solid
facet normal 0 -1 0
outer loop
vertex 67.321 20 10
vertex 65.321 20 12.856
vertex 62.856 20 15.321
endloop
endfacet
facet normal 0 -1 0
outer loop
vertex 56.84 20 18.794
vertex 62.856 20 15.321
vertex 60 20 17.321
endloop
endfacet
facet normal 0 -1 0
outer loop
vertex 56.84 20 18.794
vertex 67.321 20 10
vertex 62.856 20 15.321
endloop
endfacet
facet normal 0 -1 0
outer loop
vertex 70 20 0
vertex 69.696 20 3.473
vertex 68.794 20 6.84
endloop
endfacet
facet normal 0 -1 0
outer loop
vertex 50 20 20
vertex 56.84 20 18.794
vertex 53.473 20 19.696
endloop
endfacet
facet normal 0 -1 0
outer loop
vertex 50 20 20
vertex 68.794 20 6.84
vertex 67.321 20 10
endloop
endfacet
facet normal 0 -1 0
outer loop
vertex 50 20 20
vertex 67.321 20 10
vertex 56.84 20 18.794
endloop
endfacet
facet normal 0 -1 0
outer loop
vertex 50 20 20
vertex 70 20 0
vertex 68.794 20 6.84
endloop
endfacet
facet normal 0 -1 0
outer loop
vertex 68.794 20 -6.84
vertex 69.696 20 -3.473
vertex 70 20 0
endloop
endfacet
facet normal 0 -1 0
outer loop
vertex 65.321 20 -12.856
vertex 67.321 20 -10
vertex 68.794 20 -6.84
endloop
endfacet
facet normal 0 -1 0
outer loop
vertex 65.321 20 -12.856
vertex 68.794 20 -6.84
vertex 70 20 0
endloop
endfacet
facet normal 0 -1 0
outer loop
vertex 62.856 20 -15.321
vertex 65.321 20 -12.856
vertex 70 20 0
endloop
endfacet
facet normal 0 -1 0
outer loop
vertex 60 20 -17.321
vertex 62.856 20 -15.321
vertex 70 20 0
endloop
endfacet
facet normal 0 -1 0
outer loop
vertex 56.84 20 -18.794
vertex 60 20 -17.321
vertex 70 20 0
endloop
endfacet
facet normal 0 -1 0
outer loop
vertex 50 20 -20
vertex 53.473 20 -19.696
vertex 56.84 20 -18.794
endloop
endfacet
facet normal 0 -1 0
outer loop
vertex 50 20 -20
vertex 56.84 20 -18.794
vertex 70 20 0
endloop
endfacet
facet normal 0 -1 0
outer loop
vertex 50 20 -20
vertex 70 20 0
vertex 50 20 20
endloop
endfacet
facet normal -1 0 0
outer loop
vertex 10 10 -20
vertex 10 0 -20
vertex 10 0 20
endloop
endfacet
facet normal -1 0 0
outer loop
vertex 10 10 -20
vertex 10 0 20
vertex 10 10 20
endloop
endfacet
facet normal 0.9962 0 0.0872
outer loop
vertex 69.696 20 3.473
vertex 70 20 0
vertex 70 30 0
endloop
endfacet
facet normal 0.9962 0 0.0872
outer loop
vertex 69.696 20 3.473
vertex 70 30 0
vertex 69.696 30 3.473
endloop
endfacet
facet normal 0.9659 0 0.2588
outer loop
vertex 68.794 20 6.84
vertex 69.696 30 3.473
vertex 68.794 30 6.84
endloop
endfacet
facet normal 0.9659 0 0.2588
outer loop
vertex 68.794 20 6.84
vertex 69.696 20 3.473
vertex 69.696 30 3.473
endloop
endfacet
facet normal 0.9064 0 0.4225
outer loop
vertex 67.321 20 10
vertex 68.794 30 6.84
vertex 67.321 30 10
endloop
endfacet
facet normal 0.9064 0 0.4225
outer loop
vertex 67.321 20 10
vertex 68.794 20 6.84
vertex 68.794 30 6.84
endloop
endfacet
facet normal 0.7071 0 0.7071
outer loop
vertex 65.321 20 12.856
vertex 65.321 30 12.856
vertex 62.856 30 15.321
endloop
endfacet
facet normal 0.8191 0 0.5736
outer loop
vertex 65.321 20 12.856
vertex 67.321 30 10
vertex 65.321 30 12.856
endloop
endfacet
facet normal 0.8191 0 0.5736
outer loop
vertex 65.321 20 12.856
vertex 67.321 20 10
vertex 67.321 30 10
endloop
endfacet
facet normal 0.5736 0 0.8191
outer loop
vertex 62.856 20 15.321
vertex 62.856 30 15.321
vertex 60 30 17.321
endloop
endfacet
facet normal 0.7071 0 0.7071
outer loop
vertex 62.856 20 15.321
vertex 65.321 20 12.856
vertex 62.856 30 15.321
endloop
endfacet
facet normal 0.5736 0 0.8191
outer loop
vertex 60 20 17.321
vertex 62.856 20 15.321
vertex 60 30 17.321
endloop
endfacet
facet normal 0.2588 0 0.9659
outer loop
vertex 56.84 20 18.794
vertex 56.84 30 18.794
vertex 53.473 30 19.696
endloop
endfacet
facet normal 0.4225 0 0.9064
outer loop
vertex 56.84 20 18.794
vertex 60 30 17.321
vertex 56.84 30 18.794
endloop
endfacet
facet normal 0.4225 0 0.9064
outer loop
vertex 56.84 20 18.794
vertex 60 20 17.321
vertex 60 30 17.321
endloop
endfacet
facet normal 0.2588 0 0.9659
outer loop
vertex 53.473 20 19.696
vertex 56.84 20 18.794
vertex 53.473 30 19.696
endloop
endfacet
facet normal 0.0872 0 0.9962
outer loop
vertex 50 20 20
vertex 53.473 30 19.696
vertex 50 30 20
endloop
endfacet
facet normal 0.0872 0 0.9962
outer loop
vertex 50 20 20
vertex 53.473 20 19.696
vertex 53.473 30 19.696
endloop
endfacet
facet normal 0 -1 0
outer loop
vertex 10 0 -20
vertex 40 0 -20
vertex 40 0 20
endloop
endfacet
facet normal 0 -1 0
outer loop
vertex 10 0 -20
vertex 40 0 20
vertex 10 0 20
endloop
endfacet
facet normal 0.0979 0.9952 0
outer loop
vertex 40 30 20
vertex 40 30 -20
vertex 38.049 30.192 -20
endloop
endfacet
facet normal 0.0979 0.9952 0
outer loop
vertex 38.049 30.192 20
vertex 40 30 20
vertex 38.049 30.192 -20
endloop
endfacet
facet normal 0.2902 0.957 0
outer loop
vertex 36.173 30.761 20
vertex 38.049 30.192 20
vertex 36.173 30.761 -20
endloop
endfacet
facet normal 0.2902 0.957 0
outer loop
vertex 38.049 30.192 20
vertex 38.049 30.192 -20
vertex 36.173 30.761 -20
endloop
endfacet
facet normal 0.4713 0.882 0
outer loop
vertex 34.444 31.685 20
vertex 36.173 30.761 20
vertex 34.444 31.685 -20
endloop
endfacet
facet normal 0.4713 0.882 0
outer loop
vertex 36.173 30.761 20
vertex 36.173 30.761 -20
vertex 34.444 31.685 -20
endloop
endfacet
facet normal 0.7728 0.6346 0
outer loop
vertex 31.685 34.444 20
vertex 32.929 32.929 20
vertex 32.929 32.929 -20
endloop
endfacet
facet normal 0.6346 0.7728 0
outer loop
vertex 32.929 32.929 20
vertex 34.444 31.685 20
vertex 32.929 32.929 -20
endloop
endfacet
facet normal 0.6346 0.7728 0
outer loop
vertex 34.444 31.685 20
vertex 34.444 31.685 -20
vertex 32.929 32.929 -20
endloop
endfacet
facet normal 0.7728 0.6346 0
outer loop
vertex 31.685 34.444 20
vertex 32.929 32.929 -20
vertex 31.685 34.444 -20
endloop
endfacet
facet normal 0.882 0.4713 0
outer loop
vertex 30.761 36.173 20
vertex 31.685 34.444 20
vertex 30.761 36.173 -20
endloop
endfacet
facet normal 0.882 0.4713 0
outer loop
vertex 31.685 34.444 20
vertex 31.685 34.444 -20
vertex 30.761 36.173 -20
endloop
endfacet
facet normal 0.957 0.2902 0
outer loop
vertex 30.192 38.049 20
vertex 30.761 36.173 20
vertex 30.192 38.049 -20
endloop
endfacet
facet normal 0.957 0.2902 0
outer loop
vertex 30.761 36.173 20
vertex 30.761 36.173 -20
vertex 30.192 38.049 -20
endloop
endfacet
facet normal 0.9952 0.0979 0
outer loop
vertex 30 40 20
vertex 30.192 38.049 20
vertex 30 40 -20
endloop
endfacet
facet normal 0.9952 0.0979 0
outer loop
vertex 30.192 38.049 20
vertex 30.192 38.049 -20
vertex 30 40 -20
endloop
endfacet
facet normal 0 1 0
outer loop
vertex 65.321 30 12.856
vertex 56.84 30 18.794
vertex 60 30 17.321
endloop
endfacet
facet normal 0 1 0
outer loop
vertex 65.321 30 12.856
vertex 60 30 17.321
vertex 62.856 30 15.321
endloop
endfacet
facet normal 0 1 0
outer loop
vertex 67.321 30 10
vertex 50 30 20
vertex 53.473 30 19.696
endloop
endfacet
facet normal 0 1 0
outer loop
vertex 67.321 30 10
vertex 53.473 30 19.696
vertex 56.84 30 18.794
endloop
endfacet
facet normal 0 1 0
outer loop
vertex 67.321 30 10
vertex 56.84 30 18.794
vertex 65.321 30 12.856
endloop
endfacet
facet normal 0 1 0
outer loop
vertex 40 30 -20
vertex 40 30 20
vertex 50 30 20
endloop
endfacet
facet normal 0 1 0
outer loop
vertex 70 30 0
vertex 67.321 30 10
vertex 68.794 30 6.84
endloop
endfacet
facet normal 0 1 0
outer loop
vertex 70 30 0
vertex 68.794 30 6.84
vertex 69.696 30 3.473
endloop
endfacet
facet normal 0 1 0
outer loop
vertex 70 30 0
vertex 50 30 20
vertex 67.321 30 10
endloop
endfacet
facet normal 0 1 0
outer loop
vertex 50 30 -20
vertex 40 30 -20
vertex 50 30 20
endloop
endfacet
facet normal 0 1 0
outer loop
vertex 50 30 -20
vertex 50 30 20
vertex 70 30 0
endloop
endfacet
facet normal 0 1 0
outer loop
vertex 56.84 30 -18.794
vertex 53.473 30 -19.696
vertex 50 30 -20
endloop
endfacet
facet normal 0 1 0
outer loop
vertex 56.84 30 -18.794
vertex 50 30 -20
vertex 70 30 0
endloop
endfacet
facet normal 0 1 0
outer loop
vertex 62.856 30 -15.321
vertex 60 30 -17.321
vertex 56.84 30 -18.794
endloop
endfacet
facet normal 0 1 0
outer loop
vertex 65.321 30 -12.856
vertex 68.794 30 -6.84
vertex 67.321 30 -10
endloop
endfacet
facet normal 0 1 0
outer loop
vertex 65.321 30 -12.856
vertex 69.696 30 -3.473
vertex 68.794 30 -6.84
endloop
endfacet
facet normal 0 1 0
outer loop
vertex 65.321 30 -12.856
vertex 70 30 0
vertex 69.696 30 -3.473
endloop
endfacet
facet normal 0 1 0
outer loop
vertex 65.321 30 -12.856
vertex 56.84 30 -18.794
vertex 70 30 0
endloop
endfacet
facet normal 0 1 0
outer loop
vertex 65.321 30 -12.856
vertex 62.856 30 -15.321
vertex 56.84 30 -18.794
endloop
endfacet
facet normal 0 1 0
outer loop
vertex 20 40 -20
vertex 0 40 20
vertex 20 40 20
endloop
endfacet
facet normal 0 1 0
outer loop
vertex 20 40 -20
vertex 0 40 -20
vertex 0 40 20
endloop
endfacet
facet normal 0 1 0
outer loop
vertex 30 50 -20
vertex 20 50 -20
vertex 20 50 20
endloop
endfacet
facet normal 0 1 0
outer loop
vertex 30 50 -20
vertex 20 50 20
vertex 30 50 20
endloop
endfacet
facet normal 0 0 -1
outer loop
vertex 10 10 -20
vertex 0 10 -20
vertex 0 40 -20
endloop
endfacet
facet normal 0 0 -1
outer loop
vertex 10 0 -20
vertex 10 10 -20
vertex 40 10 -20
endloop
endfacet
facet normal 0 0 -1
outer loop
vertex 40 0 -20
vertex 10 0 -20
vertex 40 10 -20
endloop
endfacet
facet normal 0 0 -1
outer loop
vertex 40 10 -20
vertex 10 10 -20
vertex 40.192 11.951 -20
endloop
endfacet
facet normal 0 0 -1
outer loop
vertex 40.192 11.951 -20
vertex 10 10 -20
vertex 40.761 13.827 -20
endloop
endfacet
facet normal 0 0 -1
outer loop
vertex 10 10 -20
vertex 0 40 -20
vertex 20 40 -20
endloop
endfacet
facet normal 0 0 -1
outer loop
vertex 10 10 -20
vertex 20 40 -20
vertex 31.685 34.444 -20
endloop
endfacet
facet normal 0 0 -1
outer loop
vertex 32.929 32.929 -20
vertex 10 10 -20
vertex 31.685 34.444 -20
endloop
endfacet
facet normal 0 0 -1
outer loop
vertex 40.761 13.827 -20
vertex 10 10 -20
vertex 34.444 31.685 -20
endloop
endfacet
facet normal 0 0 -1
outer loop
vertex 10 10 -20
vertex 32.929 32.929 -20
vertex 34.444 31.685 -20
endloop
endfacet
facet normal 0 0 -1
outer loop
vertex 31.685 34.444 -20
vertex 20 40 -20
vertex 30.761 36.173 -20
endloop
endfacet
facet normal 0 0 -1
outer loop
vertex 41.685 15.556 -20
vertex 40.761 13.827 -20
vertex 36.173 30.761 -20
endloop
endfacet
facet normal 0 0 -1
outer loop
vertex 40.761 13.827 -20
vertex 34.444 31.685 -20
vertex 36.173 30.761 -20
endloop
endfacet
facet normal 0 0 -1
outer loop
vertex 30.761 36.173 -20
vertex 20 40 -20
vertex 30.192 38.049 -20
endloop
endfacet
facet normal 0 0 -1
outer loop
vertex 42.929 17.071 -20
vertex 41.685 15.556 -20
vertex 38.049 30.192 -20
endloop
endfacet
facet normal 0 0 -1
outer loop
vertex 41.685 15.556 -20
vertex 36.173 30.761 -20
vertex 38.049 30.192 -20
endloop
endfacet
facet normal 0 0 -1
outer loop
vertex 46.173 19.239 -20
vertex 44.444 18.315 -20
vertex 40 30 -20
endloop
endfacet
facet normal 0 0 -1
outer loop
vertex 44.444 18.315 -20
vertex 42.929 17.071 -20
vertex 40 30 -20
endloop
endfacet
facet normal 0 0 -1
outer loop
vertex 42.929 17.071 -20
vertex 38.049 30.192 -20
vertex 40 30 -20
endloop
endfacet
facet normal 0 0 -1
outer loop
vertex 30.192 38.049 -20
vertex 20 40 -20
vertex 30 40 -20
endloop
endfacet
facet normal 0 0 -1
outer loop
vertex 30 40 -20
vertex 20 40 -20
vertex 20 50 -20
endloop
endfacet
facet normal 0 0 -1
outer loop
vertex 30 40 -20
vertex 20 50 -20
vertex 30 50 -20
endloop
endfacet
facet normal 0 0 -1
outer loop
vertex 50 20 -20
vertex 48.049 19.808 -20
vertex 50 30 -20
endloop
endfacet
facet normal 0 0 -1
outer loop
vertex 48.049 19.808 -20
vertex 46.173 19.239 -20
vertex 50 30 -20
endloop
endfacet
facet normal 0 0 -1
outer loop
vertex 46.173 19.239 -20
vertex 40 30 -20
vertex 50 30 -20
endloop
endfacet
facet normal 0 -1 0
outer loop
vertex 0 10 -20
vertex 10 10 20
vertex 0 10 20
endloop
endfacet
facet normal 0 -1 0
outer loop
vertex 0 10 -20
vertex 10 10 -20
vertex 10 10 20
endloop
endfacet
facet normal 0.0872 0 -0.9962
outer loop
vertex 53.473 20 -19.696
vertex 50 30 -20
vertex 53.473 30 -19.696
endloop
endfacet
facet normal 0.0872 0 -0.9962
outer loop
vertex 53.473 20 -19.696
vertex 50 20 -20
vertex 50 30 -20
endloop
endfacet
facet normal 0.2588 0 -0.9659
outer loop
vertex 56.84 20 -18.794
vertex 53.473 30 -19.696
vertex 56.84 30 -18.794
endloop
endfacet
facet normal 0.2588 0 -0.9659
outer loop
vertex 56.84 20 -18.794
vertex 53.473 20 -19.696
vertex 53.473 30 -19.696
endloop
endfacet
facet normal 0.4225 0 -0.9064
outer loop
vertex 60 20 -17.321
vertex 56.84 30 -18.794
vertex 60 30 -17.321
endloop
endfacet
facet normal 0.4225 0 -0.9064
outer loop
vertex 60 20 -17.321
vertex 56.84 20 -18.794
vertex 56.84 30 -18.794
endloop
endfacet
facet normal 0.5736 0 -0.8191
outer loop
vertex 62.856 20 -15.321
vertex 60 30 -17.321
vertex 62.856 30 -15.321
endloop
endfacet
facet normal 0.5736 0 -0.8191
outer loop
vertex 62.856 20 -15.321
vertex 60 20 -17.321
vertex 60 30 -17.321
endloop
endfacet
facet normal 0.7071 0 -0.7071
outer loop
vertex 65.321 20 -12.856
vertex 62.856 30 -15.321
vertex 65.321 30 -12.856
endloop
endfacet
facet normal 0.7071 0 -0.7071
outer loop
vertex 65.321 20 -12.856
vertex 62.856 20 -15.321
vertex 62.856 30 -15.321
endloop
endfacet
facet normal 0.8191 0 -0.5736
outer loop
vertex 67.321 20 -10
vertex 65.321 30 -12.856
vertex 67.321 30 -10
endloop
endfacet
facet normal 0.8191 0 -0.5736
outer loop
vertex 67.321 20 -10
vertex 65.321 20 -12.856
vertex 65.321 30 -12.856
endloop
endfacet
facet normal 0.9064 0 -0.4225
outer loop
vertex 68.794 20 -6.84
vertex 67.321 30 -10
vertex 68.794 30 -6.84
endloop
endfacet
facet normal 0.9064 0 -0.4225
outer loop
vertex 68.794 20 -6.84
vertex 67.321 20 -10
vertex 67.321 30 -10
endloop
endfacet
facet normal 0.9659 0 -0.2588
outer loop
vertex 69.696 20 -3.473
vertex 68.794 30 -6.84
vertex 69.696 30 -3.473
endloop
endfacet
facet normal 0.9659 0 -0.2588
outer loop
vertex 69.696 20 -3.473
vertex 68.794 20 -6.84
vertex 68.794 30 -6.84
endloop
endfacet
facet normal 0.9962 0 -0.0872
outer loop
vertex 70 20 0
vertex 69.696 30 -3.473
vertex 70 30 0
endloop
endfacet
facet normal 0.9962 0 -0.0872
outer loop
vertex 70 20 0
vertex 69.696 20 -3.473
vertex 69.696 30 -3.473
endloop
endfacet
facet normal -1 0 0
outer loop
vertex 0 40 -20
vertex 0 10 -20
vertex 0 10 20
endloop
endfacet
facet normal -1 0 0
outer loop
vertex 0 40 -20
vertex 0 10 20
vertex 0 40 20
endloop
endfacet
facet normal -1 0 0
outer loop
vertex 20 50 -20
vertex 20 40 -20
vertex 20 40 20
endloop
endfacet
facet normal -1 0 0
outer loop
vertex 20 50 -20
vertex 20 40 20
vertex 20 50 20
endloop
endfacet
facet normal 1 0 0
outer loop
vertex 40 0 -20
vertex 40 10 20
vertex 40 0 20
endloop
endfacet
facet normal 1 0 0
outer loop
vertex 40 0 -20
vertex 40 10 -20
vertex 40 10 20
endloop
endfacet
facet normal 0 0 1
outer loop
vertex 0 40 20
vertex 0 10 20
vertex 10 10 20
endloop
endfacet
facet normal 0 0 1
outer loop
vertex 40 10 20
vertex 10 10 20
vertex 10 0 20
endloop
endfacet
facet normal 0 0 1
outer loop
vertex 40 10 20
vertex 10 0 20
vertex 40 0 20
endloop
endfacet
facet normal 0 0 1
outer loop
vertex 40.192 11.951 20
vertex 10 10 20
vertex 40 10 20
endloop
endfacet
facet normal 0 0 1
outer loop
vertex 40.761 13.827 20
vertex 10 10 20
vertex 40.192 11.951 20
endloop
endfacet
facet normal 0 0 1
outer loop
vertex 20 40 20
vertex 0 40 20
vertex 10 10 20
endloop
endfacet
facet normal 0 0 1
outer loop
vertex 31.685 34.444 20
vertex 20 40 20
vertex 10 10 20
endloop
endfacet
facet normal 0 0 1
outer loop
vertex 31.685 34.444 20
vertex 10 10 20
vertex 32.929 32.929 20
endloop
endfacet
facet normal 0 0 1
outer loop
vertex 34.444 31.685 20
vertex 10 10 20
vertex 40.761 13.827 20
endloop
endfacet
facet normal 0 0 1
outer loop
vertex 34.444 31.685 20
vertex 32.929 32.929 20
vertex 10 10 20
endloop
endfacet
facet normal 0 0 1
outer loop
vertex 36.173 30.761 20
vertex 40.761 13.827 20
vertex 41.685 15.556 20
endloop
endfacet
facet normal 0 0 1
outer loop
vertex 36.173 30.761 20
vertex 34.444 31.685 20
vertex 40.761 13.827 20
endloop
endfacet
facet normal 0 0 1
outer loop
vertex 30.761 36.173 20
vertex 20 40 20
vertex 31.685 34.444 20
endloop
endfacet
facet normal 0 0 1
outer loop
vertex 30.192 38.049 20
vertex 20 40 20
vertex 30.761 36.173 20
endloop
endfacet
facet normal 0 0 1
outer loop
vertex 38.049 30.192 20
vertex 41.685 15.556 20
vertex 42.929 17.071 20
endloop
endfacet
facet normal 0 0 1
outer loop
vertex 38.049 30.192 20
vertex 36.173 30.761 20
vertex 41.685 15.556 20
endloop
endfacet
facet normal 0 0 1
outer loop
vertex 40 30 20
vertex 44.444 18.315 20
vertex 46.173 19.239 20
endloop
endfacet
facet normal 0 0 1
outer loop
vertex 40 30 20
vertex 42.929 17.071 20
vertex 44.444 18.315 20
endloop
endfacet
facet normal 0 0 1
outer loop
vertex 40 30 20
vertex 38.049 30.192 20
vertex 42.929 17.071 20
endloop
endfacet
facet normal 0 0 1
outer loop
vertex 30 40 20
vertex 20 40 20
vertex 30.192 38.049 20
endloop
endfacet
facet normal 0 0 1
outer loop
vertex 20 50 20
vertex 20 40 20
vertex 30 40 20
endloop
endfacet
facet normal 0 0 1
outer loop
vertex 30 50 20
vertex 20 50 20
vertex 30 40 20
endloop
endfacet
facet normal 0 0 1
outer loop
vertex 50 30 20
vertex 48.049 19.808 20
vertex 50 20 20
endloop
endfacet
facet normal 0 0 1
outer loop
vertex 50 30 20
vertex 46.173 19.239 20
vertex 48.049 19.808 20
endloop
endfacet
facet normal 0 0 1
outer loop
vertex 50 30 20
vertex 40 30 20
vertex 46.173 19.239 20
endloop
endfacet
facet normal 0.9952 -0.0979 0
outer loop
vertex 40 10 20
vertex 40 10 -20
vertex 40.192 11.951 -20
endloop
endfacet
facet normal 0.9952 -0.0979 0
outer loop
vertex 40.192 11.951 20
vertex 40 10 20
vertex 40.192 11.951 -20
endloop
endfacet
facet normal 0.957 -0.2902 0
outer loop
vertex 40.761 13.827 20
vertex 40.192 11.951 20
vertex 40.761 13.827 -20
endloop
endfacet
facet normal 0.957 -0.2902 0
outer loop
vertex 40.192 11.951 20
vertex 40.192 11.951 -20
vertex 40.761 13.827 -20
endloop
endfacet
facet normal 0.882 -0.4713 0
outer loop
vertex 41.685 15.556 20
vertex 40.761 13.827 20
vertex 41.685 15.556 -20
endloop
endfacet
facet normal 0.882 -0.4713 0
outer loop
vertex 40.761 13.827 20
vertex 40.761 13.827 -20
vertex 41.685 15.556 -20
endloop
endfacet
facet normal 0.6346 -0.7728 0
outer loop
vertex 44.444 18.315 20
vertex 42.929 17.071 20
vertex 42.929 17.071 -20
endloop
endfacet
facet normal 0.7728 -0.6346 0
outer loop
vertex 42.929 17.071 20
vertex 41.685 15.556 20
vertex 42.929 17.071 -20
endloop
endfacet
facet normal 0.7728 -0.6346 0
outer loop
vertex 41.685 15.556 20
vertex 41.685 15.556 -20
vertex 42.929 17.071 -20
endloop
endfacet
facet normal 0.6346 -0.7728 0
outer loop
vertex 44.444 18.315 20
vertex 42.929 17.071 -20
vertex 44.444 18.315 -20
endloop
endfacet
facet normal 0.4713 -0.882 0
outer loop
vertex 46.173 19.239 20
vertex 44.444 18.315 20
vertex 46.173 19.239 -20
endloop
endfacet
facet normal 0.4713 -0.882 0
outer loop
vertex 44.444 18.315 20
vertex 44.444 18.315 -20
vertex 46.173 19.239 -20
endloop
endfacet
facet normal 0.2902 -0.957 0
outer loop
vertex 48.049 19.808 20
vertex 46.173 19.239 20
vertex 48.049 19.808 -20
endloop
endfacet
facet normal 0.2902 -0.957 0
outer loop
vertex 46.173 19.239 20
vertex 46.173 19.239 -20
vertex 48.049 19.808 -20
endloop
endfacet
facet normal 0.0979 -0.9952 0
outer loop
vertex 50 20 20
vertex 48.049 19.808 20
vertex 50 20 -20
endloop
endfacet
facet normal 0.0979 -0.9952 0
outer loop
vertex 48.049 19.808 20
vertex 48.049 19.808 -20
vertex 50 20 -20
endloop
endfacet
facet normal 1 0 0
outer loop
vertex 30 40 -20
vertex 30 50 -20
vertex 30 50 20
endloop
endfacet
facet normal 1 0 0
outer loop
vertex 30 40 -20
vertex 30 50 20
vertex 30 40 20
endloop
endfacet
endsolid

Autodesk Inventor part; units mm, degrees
ref_plane "YZ Plane" through (0, 0, 0) normal (1, 0, 0) x (0, 1, 0)
ref_plane "XZ Plane" through (0, 0, 0) normal (0, 1, 0) x (-1, 0, 0)
ref_plane "XY Plane" through (0, 0, 0) normal (0, 0, 1) x (1, 0, 0)
sketch "草圖1" plane through (0, 0, 0) normal (0, 0, 1) x (1, 0, 0)
  line L0 (0, 0) -> (0, 40)
  line L1 (0, 40) -> (20, 40)
  line L2 (20, 40) -> (20, 50)
  line L3 (20, 50) -> (30, 50)
  line L4 (30, 50) -> (30, 40)
  arc A0 (30, 40) -> (40, 30) centre (40, 40) ccw
  line L5 (40, 30) -> (70, 30)
  line L6 (70, 30) -> (70, 20)
  line L7 (70, 20) -> (50, 20)
  arc A1 (50, 20) -> (40, 10) centre (50, 10) ccw
  line L8 (40, 10) -> (40, 0)
  line L9 (40, 0) -> (0, 0)
  line L10 (0, 0) -> (10, 0)
  line L11 (10, 0) -> (10, 10)
  line L12 (10, 10) -> (0, 10)
  line L13 (0, 10) -> (0, 0)
  dimension "d0" = 40
  dimension "d1" = 20
  dimension "d2" = 10
  dimension "d3" = 50
  dimension "d4" = 70
  dimension "d5" = 40
  dimension "d6" = 10
  dimension "d7" = 20
  dimension "d8" = 10
  dimension "d9" = 10
  dimension "d10" = 10
extrude "擠出1" add sketch "草圖1" along normal mid plane 40 contours L0 L1 L2 L3 L4 A0 L5 L6 L7 A1 L8 L9 L11 L12
fillet "圓角1" radius 20 2 edges at (70, 25, 20) (70, 25, -20)
properties part number "21" material "鋼、碳鋼"
